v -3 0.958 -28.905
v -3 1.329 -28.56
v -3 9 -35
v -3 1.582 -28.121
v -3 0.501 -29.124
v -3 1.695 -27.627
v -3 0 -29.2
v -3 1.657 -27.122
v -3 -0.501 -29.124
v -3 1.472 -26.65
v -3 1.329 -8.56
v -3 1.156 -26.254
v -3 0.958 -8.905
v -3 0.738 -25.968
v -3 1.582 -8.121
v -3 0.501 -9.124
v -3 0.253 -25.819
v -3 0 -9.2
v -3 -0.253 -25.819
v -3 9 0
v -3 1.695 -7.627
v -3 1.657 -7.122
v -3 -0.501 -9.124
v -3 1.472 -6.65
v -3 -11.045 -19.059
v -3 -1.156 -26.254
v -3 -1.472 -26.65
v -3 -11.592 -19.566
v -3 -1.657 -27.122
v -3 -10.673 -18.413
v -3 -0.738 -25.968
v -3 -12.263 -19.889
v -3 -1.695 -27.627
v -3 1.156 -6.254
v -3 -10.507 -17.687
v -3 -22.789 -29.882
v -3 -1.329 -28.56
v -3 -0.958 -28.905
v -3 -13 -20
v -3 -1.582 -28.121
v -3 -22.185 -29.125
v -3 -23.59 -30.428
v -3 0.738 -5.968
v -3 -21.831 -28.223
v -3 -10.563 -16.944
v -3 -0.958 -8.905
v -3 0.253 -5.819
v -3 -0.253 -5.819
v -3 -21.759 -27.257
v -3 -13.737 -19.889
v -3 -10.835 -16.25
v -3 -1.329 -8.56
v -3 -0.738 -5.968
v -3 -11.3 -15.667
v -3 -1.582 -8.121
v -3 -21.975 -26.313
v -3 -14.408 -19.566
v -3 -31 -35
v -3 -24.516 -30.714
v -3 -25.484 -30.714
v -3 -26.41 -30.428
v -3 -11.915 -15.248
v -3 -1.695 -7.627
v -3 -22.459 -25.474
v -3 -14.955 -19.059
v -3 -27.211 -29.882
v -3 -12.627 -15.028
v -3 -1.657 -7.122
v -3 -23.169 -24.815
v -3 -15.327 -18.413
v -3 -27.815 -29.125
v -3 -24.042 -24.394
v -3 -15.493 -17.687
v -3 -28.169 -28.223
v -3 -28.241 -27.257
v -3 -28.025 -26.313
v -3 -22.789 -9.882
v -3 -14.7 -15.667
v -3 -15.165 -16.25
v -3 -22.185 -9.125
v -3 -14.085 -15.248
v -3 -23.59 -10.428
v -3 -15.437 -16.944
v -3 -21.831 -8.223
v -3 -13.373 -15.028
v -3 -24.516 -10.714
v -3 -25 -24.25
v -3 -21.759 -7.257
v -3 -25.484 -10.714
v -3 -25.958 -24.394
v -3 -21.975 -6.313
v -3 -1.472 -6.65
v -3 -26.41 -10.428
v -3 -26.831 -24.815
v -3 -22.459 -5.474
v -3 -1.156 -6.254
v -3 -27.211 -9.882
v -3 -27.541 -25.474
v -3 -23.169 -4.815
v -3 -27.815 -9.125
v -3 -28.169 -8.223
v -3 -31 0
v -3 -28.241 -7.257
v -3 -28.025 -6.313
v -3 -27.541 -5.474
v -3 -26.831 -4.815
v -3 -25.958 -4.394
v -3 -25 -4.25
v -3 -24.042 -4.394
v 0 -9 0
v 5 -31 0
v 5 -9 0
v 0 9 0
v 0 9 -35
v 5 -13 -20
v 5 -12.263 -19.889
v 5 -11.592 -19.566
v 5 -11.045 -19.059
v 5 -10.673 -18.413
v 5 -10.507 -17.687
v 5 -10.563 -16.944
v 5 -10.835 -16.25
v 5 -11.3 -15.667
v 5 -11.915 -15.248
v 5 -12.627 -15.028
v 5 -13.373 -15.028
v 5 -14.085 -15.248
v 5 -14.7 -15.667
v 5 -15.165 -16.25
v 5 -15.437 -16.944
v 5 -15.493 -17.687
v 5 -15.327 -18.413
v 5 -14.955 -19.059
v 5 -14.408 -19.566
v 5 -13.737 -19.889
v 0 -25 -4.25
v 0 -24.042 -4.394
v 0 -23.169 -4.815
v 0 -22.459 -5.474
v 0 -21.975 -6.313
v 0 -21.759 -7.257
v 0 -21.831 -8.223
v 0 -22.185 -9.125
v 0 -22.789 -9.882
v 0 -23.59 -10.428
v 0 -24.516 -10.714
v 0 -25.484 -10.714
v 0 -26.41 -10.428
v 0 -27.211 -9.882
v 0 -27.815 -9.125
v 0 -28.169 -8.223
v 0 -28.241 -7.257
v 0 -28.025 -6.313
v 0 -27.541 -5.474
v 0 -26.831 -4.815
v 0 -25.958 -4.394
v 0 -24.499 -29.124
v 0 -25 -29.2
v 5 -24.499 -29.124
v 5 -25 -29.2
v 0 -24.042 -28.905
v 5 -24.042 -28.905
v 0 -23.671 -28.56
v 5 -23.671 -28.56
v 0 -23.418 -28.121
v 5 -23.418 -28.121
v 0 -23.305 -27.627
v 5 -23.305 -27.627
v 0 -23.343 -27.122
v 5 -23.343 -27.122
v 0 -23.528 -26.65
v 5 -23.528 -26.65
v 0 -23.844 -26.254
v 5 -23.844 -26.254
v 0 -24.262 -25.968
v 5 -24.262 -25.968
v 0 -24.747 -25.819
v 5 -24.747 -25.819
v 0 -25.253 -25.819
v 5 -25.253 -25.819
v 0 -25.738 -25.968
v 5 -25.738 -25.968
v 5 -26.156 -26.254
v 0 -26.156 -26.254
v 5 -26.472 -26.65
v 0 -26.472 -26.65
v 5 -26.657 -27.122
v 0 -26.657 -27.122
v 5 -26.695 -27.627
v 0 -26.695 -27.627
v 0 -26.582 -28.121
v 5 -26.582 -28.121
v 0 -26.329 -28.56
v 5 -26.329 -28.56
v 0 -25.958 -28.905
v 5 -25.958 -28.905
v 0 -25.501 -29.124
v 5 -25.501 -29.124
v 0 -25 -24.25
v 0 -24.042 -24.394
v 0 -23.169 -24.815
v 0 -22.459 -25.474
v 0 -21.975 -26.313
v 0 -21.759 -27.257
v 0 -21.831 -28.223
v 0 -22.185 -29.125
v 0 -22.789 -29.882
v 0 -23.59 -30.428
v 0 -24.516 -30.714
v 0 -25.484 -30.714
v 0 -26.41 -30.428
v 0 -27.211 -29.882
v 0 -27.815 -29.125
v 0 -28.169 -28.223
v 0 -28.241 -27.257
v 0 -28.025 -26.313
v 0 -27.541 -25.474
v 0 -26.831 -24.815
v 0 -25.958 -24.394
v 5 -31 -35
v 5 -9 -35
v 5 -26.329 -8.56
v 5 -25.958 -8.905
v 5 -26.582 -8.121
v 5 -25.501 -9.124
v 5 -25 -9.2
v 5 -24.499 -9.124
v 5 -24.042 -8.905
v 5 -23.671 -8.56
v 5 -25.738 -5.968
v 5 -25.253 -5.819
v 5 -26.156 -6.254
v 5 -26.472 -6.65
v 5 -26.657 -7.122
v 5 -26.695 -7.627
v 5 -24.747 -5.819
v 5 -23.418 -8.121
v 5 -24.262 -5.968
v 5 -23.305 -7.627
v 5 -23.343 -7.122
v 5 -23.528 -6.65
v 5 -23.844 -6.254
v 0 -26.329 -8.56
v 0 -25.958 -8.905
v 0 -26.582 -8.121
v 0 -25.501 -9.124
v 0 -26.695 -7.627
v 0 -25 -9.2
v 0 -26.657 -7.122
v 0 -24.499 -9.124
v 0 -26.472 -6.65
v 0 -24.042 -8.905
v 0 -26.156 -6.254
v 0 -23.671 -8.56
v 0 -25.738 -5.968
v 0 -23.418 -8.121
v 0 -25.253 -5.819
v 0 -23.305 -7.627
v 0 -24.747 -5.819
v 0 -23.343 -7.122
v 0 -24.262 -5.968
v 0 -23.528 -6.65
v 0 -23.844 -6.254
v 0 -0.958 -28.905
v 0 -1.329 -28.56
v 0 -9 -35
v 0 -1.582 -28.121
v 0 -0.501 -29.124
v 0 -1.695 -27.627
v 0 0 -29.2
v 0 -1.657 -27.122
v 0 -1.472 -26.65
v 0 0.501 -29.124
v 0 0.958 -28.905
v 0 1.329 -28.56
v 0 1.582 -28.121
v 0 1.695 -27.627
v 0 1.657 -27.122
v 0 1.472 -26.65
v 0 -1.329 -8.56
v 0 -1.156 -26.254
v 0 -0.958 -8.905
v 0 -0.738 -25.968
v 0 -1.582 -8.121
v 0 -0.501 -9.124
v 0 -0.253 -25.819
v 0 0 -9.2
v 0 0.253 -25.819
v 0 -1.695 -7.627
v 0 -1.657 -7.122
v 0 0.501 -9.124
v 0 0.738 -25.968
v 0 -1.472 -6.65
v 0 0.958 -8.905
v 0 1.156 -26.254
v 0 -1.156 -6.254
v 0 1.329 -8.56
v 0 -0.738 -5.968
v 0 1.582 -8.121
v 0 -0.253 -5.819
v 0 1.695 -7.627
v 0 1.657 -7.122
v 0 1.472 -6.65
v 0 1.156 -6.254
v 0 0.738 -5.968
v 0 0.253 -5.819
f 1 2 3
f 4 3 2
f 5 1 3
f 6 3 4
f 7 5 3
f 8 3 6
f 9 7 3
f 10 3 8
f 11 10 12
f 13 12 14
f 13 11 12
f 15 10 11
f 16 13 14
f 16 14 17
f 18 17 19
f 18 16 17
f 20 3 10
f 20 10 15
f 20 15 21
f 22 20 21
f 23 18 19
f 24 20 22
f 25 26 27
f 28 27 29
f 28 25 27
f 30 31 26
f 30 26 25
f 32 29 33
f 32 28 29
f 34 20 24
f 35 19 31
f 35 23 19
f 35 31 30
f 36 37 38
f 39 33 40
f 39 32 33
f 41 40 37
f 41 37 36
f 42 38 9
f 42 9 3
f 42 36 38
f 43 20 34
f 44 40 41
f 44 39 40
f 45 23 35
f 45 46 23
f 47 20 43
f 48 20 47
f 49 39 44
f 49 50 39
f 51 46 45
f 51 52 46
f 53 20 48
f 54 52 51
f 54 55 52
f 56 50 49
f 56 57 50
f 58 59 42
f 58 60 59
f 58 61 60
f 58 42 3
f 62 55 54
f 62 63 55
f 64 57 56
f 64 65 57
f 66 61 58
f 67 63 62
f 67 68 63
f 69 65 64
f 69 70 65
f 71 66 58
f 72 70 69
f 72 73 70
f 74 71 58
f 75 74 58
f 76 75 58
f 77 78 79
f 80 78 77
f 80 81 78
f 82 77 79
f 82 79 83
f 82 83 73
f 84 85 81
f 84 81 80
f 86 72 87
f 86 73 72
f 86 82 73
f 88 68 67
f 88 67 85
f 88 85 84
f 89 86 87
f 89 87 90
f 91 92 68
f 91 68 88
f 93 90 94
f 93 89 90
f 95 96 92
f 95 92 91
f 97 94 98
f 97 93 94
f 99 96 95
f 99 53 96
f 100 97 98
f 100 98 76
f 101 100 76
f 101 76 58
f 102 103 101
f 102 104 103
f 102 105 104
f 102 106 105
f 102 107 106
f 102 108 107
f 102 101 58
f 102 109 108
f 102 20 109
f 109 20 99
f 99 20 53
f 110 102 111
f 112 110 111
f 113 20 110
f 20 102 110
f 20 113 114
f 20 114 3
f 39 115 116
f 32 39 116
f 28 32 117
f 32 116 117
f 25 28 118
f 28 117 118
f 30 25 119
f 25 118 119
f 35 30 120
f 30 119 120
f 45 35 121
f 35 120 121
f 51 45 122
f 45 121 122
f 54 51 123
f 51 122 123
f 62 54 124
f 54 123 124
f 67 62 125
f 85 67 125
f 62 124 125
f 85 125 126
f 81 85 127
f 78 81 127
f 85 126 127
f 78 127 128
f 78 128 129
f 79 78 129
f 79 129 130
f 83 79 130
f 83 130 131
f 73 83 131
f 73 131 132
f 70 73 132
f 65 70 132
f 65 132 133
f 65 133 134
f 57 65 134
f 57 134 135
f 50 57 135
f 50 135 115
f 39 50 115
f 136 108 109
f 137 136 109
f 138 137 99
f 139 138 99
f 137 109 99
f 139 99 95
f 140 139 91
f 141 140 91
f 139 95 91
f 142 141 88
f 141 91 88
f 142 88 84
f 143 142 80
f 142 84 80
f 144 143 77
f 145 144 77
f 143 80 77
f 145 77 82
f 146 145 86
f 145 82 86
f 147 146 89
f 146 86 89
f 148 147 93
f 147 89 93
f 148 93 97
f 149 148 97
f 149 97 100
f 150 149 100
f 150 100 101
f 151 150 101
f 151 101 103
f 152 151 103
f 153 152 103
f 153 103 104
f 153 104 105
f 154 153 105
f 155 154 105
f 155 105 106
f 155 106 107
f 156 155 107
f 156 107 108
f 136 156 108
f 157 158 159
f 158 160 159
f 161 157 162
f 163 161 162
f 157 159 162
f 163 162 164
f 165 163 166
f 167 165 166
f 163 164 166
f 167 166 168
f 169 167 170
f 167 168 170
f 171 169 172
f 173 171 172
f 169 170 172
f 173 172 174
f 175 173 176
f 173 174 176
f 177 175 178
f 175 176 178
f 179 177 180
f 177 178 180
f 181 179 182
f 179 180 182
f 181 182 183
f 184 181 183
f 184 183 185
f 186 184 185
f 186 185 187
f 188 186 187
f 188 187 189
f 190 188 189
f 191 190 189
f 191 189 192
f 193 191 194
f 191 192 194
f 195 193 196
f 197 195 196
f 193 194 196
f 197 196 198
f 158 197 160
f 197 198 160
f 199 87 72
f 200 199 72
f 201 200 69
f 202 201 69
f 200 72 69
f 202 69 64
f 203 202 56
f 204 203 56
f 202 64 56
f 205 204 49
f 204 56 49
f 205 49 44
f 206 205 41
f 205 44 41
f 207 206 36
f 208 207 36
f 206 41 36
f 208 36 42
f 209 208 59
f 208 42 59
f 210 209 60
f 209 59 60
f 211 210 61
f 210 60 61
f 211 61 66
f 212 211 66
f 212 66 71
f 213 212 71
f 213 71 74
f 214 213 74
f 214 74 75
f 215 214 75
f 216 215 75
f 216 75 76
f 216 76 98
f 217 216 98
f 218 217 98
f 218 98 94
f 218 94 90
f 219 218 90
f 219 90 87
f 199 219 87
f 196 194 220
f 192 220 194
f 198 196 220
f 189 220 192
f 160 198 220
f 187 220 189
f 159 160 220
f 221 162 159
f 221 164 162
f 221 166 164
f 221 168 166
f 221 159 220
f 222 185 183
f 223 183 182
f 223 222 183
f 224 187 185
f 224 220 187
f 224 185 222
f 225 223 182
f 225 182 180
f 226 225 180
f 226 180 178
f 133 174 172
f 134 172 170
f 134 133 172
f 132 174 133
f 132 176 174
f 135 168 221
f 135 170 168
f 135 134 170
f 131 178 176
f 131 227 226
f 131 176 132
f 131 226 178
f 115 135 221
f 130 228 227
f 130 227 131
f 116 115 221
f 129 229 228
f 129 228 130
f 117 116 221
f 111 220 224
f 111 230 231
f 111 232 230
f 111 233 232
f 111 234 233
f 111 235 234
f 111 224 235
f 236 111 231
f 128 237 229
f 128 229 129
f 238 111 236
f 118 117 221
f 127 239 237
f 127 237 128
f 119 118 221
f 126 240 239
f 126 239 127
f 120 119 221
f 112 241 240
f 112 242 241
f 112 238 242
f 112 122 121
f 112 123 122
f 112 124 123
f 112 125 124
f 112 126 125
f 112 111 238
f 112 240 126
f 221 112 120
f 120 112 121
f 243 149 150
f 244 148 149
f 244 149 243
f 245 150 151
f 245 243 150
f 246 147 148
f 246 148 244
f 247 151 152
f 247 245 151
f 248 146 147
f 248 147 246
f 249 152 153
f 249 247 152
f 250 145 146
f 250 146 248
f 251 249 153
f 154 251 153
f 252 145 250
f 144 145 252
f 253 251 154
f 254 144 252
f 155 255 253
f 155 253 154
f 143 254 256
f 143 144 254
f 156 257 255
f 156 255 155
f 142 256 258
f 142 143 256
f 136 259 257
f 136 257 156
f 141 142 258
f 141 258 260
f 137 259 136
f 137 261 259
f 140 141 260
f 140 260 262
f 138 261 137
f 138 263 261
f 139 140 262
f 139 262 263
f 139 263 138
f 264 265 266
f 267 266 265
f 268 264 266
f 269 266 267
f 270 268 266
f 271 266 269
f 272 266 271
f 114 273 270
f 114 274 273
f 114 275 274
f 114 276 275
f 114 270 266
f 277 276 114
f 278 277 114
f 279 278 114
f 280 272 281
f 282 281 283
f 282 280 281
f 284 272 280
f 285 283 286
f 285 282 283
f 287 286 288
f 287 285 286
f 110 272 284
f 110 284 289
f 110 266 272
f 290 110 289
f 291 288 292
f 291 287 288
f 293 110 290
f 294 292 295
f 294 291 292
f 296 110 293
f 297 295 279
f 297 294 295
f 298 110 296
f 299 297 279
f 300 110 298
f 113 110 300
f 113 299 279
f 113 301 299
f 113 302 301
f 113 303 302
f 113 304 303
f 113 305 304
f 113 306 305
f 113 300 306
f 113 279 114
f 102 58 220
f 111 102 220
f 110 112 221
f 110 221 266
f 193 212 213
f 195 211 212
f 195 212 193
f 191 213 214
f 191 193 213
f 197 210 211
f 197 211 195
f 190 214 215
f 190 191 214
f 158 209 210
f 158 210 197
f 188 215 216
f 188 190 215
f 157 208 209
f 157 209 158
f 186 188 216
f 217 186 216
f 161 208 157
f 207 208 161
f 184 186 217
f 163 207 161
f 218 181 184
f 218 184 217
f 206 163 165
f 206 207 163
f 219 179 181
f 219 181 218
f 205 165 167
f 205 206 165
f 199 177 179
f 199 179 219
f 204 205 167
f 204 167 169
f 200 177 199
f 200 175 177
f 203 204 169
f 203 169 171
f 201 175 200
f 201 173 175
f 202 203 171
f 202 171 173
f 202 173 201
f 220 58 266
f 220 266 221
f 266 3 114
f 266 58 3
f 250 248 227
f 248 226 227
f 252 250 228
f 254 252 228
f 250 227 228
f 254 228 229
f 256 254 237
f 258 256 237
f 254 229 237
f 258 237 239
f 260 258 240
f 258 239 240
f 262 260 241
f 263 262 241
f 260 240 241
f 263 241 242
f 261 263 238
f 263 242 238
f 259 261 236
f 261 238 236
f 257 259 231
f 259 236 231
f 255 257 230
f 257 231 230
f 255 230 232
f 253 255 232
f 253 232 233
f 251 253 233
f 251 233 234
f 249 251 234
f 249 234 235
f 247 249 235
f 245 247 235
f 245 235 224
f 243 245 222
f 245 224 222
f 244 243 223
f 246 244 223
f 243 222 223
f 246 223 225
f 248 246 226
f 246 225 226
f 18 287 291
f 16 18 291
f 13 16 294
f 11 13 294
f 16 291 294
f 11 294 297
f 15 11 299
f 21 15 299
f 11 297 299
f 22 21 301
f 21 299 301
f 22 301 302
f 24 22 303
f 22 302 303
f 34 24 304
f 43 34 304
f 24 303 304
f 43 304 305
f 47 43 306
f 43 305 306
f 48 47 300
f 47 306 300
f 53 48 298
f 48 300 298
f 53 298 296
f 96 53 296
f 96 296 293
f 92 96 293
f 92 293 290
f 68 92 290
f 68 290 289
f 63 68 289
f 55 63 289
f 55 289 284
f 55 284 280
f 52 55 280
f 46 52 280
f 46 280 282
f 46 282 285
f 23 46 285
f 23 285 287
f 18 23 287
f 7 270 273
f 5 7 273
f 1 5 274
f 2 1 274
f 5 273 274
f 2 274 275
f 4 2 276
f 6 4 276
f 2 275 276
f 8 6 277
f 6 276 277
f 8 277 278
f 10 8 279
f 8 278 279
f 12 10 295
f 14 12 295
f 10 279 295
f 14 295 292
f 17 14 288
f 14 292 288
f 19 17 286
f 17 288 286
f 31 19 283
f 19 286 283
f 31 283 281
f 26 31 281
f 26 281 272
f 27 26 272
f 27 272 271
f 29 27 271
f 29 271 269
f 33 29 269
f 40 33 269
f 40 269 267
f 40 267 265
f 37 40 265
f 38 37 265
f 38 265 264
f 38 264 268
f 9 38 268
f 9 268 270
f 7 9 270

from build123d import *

# Parameters (mm, degrees)
BOSS_EXTRUDE1_DEPTH            = 35
M3_CLEARANCE_HOLE2_D           = 3.4
CBORE_FOR_M3_SHCS1_D           = 3.4
CBORE_FOR_M3_SHCS1_CBORE_D     = 6.5
CBORE_FOR_M3_SHCS1_CBORE_DEPTH = 3
TAP_DRILL_FOR_M6X1_0_TAP1_D    = 5


with BuildPart() as part:
    # Sketch1 → Boss-Extrude1 (new body)
    with BuildSketch(Plane.XY):
        Polygon((0, 9), (-3, 9), (-3, -31), (0, -31), (5, -31), (5, -9), (0, -9), align=None)
    extrude(amount=-BOSS_EXTRUDE1_DEPTH)

    # M3 Clearance Hole2 (through all)
    with Locations(Plane.ZY.offset(3)):
        with Locations((-7.5, 0), (-27.5, 0)):
            Hole(M3_CLEARANCE_HOLE2_D / 2)

    # CBORE for M3 SHCS1 (through all)
    with Locations(Plane.ZY.offset(3)):
        with Locations((-7.5, -25), (-27.5, -25)):
            CounterBoreHole(CBORE_FOR_M3_SHCS1_D / 2, CBORE_FOR_M3_SHCS1_CBORE_D / 2, CBORE_FOR_M3_SHCS1_CBORE_DEPTH)

    # Tap Drill for M6x1.0 Tap1 (through all)
    with Locations(Plane.ZY.offset(3)):
        with Locations((-17.5, -13)):
            Hole(TAP_DRILL_FOR_M6X1_0_TAP1_D / 2)


solid = part.part
